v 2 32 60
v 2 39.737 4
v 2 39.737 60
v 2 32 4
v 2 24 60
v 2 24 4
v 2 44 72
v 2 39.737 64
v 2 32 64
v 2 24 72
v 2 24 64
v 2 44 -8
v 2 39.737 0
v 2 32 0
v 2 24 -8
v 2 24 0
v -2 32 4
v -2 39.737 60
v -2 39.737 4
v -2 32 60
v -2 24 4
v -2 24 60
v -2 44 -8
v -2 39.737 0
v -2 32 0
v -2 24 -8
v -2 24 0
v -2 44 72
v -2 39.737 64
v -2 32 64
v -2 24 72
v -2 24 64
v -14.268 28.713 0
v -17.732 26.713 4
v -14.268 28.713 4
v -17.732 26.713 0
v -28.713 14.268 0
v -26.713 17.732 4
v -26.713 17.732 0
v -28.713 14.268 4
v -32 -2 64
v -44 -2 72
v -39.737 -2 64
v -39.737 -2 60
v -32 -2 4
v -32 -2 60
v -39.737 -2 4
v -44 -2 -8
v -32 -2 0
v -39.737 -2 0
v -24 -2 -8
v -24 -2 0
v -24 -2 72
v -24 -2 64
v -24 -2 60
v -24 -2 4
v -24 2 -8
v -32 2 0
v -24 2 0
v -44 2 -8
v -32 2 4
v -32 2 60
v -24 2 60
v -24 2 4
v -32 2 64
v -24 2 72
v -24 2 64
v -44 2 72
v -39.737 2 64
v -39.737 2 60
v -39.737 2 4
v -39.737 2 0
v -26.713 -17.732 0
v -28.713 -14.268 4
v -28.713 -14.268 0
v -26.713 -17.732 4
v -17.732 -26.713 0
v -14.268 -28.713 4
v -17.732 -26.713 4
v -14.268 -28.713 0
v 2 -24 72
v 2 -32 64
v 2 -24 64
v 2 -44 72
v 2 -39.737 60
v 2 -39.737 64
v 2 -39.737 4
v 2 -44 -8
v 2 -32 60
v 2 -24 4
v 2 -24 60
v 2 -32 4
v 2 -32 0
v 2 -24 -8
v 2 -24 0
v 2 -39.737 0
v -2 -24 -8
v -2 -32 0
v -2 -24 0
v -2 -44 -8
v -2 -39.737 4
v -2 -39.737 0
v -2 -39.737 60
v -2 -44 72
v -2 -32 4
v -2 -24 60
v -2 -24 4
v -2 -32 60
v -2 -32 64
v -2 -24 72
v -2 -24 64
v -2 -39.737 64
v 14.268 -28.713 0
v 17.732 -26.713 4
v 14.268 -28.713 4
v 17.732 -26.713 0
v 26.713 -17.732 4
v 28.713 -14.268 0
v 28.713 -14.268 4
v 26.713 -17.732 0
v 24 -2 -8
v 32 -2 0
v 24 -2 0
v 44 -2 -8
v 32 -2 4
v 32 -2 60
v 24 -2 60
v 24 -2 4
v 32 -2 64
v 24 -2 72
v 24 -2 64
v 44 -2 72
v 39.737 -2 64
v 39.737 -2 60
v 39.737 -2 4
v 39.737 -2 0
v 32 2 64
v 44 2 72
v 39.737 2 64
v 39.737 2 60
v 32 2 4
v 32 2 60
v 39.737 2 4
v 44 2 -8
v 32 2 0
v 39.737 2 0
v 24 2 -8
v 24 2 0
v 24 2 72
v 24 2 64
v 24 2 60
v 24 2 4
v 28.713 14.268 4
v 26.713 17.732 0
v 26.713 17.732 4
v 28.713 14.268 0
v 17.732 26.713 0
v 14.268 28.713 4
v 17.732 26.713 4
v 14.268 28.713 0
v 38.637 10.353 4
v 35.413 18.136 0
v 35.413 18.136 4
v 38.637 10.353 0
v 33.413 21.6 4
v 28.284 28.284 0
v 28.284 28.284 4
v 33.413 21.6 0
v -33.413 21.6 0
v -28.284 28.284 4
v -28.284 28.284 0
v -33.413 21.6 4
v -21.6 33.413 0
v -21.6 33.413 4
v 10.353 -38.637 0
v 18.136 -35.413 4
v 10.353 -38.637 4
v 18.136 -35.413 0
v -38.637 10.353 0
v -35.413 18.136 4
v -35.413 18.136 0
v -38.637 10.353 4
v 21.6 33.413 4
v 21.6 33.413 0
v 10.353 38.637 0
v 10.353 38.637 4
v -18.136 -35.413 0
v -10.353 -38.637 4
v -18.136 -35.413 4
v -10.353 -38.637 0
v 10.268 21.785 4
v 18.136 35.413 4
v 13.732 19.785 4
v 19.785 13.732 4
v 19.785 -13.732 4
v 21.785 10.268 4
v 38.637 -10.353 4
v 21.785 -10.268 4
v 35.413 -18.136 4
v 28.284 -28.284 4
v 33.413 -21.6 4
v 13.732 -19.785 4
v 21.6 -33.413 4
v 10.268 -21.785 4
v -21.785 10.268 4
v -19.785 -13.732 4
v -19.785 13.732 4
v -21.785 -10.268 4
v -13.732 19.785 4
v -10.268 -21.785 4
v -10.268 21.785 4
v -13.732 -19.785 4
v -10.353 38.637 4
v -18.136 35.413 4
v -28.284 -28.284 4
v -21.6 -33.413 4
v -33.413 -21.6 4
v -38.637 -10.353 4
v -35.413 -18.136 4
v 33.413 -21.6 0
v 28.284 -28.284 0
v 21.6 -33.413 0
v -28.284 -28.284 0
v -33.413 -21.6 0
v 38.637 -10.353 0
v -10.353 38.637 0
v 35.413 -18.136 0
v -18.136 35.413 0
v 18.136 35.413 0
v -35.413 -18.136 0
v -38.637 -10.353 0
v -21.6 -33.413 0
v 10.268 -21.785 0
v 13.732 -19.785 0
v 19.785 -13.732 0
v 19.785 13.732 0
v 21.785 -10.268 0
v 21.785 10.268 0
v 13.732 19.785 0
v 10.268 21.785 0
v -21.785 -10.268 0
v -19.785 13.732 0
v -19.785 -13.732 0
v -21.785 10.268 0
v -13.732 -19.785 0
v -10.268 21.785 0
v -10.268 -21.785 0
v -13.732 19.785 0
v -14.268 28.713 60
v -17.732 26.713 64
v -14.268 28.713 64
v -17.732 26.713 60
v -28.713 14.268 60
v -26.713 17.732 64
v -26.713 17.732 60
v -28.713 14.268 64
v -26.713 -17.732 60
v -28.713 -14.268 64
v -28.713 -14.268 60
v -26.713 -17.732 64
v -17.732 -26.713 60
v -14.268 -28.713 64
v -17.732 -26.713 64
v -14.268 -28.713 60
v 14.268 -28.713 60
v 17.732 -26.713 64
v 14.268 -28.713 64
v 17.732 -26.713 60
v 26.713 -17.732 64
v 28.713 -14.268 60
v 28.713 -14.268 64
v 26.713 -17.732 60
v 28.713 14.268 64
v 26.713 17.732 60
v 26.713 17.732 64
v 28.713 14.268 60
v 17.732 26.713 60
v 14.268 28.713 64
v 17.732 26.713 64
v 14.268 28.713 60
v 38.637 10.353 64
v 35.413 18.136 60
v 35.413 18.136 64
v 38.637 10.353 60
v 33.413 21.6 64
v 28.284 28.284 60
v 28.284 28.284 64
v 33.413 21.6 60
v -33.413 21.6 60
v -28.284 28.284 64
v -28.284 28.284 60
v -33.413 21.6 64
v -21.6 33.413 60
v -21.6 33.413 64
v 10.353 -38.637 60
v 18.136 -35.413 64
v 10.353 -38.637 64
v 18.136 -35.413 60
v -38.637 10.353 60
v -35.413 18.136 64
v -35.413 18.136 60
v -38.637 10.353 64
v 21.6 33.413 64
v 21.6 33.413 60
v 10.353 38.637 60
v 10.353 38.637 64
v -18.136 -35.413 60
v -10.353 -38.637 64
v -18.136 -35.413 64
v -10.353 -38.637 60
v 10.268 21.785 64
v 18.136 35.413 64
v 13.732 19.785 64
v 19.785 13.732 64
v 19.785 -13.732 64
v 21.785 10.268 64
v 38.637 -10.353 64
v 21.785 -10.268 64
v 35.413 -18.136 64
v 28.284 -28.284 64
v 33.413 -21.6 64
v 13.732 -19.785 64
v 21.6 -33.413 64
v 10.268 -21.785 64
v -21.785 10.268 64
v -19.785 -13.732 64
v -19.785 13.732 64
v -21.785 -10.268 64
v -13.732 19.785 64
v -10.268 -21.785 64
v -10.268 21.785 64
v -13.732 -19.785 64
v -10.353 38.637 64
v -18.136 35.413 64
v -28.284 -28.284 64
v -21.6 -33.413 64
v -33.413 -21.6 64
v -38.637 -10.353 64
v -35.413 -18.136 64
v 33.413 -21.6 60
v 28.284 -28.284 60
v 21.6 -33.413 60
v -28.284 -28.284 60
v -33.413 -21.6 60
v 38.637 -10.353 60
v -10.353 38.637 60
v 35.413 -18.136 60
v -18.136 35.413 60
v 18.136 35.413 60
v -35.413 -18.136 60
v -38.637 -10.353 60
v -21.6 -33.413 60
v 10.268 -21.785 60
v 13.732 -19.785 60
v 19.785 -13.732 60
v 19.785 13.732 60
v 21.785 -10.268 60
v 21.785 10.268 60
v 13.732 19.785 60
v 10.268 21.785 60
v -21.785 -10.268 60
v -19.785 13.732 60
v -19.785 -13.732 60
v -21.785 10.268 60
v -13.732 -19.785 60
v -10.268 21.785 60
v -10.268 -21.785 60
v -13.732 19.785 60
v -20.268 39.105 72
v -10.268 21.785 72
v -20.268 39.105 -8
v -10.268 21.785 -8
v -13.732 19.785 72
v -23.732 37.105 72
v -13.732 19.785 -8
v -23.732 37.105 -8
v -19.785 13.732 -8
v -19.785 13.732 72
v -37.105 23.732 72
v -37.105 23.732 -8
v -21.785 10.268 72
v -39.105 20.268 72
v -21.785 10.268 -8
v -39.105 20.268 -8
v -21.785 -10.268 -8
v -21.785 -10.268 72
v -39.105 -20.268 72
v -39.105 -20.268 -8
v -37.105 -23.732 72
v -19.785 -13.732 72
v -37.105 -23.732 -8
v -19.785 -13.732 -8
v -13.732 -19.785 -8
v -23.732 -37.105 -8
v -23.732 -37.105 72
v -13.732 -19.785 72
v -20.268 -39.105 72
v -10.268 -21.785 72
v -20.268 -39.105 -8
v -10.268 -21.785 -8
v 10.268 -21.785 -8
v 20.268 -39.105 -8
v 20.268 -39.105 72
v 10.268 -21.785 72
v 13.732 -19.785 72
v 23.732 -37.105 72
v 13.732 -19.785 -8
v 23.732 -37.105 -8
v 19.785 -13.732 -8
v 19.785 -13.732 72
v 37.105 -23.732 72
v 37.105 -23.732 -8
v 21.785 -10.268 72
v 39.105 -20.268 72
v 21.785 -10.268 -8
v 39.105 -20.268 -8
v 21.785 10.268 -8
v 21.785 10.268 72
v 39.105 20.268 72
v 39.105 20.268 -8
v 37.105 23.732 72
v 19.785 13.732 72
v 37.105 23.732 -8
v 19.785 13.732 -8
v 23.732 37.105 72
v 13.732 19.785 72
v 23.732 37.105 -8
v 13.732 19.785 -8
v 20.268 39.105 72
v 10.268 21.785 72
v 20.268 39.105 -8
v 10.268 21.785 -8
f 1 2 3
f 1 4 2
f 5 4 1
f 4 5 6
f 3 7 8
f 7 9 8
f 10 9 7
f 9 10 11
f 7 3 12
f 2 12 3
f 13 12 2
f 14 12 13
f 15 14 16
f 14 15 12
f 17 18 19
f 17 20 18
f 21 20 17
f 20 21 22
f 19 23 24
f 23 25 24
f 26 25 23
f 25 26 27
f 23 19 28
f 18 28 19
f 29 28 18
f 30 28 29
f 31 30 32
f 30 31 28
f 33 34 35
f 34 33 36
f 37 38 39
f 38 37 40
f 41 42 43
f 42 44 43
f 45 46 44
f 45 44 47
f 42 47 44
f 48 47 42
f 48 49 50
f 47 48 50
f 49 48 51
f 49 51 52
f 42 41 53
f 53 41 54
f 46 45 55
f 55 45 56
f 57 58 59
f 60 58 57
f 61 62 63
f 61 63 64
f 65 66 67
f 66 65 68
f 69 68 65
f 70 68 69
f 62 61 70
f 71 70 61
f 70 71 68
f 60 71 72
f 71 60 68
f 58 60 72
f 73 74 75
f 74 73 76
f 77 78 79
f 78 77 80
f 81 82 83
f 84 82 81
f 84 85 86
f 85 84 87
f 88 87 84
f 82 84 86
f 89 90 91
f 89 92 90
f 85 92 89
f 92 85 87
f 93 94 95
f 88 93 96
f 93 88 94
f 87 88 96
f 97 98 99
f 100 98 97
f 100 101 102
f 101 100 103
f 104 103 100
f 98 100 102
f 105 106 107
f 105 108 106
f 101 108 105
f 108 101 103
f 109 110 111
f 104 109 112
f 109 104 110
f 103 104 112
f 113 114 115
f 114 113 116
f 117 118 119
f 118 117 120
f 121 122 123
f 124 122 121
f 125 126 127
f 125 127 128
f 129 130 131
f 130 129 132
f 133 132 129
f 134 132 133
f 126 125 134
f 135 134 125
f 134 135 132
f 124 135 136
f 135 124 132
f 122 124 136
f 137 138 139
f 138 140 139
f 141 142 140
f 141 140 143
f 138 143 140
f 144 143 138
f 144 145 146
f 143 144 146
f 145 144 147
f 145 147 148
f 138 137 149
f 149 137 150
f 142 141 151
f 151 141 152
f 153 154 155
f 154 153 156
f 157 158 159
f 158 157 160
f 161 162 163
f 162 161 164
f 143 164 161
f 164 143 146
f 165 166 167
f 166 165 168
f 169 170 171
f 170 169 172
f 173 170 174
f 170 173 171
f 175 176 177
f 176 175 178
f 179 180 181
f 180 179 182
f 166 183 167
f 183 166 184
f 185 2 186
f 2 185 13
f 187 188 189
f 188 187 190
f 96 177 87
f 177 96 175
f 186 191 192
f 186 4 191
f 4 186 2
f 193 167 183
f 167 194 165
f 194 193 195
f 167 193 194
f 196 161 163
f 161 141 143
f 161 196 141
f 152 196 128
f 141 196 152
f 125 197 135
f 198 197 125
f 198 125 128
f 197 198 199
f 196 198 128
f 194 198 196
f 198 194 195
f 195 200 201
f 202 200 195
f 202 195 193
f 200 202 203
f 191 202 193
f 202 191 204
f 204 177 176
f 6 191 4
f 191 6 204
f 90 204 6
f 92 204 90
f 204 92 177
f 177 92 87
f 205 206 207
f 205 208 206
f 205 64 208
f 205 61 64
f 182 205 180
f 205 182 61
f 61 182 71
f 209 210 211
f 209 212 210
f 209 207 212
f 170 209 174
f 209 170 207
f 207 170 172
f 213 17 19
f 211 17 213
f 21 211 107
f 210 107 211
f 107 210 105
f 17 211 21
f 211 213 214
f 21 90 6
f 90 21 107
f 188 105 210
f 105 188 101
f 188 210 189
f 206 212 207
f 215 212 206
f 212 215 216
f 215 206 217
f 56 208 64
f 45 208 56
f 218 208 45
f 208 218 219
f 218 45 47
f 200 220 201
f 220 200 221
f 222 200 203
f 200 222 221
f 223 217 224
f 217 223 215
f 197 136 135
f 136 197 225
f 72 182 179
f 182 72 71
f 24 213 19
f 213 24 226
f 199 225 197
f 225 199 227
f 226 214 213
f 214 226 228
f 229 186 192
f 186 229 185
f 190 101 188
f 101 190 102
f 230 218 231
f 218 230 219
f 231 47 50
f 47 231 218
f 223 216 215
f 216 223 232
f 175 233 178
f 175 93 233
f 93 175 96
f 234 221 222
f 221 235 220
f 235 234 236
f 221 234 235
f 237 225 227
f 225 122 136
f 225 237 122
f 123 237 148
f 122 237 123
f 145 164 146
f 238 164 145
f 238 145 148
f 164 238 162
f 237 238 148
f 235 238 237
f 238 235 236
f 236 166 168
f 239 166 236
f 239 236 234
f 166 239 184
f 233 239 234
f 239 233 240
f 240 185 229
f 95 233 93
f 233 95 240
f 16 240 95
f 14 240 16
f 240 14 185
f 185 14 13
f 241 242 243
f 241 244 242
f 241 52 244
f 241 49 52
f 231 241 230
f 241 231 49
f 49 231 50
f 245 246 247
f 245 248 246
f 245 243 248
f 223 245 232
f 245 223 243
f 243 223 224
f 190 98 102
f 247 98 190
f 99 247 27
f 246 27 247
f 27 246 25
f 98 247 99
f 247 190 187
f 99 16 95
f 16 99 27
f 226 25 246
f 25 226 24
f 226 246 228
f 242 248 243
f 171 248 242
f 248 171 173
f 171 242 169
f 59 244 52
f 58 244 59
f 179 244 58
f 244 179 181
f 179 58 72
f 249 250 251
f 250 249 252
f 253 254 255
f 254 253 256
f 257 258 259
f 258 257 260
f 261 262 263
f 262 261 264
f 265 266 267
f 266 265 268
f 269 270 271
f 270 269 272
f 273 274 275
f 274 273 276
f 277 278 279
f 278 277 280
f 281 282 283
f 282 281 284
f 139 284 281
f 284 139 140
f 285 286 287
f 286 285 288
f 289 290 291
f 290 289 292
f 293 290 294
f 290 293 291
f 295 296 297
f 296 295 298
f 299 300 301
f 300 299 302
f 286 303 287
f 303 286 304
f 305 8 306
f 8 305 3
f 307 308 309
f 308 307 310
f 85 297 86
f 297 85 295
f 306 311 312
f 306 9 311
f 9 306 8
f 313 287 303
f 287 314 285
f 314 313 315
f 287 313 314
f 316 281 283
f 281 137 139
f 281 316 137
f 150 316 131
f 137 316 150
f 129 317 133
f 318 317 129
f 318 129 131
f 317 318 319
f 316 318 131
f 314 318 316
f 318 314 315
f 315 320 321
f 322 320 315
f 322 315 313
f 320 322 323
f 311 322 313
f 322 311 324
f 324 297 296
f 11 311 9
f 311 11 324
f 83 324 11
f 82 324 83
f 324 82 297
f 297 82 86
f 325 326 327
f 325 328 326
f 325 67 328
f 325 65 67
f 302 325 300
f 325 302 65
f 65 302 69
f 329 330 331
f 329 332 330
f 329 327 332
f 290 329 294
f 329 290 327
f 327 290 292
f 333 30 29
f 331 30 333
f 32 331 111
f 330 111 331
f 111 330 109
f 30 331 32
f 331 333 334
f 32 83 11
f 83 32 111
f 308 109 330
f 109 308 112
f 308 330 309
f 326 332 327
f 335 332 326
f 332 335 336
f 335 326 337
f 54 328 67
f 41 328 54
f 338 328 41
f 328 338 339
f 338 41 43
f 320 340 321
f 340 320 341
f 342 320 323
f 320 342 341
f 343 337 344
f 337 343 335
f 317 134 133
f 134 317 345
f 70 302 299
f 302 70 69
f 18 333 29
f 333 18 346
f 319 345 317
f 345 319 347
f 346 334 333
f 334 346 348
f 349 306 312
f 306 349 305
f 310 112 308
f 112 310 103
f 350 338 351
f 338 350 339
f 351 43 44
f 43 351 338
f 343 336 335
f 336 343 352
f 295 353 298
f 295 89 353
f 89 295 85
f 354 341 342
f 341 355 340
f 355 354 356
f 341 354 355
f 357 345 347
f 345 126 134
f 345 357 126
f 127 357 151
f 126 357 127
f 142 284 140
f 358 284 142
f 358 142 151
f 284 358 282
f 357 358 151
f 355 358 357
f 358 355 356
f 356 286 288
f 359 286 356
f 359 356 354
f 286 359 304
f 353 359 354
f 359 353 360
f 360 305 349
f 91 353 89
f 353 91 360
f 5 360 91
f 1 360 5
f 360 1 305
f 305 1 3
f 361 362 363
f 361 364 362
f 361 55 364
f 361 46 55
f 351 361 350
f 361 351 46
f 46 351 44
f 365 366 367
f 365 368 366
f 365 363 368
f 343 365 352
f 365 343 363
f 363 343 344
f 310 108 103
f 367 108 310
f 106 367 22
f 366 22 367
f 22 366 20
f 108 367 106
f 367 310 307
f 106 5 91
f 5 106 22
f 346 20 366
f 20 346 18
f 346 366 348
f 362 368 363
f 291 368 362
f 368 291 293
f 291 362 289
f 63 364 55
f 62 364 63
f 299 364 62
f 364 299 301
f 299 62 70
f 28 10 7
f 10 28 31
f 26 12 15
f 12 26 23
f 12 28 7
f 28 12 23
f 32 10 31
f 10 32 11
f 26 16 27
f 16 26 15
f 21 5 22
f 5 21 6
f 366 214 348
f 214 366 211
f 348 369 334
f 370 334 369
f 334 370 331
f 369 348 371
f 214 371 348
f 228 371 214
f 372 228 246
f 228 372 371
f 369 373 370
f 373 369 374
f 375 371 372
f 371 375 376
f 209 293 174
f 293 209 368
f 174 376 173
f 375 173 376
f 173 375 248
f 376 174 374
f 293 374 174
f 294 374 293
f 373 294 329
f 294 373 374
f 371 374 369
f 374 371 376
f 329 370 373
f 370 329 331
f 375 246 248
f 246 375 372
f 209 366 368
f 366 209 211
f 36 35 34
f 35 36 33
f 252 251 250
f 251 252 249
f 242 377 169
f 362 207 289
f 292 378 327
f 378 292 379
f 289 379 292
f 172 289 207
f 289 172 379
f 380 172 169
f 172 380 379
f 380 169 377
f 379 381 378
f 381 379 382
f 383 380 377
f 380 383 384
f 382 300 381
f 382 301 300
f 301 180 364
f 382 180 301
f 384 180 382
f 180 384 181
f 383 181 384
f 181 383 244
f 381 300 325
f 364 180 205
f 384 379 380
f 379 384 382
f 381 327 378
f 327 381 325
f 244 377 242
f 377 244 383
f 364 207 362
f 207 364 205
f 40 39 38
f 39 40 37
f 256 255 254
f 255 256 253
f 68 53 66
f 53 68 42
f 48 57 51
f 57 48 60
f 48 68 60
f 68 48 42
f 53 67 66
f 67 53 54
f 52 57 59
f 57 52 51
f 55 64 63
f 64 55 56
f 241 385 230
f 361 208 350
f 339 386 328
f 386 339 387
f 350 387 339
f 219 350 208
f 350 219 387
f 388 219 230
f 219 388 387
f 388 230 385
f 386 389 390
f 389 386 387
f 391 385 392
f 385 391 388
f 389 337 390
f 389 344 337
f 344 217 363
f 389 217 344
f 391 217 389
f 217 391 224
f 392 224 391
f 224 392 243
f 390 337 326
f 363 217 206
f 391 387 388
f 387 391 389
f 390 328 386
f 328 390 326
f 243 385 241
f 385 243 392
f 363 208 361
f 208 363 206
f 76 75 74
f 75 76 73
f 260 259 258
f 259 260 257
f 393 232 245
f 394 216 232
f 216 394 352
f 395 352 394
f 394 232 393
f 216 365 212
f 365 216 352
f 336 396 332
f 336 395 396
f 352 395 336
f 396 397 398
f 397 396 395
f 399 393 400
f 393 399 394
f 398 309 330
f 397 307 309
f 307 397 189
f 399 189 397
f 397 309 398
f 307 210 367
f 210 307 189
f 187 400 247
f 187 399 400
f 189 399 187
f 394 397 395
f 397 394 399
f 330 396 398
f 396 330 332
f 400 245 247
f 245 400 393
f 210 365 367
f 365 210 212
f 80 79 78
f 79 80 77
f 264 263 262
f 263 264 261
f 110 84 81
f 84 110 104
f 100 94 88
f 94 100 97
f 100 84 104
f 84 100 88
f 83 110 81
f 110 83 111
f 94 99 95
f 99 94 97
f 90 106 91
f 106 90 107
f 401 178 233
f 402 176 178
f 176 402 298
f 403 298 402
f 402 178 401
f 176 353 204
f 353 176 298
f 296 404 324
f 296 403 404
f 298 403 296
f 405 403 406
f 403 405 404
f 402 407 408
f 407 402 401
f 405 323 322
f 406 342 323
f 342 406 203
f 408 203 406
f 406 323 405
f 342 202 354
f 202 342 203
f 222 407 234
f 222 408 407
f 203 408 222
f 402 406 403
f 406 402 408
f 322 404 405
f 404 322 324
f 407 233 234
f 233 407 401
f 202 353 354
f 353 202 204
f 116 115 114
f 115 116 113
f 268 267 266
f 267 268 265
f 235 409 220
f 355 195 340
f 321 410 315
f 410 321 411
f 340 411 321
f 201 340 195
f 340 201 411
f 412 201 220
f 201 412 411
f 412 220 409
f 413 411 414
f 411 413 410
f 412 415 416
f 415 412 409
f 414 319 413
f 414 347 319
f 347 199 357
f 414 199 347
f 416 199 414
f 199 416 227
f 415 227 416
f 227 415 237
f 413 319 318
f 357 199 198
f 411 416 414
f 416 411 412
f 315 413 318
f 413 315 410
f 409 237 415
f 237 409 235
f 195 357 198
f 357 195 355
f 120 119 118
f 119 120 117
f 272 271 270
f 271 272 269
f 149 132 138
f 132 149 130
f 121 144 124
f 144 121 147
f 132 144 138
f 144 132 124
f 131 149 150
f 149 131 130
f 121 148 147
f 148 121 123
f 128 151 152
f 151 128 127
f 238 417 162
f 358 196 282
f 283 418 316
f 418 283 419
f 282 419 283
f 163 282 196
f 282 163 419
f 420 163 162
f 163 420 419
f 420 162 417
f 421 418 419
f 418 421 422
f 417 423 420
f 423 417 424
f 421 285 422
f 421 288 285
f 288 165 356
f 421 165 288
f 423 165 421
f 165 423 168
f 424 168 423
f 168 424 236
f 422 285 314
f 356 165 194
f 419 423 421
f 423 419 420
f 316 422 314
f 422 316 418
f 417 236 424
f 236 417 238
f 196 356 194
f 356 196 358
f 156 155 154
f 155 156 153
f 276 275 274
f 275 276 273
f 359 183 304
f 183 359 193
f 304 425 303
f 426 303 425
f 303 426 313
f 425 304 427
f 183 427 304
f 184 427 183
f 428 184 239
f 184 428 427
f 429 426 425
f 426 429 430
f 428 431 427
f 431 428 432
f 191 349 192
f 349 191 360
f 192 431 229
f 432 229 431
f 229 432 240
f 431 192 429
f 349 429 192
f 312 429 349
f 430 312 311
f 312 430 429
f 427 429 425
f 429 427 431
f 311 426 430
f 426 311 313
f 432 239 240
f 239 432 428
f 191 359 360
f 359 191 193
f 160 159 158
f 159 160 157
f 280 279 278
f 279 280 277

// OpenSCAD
// VARS ###############################

$fn = 12;
base1 = 4;
space_p = 15;
r_plan = 10;

// MODULES ############################

module plan() {
  difference() {
    cylinder(h=base1,r=r_plan*base1,center=false,$fn=24);
    for (i = [0:11]) {
      rotate([0,0,30*i])
      translate([-base1/2,r_plan*base1-base1*2,-base1/2])
      cube([base1,base1*2+base1/2,base1*2],center=false);
    }
  }
}

module top() {
  //
  difference() {
    //
    plan();
    //
  }
  //
}

module lame() {
  difference() {
    //
    cube([base1,base1*5,base1*20],center=false);
    //
    //encoches
    translate([0,0,2*base1]) rotate([0,-90,0]) translate([0,-base1/2,-base1*1.5])
    cube([base1,base1*2+base1/2,base1*2],center=false);
    translate([0,0,(2+space_p)*base1]) rotate([0,-90,0]) translate([0,-base1/2,-base1*1.5])
    cube([base1,base1*2+base1/2,base1*2],center=false);
    //
    //
  }
}

// ASSEMBLY ###########################

module assembly_001() {
  plan();
  translate([0,0,base1*space_p]) top();
  for (i = [0:11]) if (i < 12) {
    rotate([0,0,30*i])
    translate([-base1/2,r_plan*base1-4*base1,-base1*2])
    lame();
  }
  //
}

assembly_001();
